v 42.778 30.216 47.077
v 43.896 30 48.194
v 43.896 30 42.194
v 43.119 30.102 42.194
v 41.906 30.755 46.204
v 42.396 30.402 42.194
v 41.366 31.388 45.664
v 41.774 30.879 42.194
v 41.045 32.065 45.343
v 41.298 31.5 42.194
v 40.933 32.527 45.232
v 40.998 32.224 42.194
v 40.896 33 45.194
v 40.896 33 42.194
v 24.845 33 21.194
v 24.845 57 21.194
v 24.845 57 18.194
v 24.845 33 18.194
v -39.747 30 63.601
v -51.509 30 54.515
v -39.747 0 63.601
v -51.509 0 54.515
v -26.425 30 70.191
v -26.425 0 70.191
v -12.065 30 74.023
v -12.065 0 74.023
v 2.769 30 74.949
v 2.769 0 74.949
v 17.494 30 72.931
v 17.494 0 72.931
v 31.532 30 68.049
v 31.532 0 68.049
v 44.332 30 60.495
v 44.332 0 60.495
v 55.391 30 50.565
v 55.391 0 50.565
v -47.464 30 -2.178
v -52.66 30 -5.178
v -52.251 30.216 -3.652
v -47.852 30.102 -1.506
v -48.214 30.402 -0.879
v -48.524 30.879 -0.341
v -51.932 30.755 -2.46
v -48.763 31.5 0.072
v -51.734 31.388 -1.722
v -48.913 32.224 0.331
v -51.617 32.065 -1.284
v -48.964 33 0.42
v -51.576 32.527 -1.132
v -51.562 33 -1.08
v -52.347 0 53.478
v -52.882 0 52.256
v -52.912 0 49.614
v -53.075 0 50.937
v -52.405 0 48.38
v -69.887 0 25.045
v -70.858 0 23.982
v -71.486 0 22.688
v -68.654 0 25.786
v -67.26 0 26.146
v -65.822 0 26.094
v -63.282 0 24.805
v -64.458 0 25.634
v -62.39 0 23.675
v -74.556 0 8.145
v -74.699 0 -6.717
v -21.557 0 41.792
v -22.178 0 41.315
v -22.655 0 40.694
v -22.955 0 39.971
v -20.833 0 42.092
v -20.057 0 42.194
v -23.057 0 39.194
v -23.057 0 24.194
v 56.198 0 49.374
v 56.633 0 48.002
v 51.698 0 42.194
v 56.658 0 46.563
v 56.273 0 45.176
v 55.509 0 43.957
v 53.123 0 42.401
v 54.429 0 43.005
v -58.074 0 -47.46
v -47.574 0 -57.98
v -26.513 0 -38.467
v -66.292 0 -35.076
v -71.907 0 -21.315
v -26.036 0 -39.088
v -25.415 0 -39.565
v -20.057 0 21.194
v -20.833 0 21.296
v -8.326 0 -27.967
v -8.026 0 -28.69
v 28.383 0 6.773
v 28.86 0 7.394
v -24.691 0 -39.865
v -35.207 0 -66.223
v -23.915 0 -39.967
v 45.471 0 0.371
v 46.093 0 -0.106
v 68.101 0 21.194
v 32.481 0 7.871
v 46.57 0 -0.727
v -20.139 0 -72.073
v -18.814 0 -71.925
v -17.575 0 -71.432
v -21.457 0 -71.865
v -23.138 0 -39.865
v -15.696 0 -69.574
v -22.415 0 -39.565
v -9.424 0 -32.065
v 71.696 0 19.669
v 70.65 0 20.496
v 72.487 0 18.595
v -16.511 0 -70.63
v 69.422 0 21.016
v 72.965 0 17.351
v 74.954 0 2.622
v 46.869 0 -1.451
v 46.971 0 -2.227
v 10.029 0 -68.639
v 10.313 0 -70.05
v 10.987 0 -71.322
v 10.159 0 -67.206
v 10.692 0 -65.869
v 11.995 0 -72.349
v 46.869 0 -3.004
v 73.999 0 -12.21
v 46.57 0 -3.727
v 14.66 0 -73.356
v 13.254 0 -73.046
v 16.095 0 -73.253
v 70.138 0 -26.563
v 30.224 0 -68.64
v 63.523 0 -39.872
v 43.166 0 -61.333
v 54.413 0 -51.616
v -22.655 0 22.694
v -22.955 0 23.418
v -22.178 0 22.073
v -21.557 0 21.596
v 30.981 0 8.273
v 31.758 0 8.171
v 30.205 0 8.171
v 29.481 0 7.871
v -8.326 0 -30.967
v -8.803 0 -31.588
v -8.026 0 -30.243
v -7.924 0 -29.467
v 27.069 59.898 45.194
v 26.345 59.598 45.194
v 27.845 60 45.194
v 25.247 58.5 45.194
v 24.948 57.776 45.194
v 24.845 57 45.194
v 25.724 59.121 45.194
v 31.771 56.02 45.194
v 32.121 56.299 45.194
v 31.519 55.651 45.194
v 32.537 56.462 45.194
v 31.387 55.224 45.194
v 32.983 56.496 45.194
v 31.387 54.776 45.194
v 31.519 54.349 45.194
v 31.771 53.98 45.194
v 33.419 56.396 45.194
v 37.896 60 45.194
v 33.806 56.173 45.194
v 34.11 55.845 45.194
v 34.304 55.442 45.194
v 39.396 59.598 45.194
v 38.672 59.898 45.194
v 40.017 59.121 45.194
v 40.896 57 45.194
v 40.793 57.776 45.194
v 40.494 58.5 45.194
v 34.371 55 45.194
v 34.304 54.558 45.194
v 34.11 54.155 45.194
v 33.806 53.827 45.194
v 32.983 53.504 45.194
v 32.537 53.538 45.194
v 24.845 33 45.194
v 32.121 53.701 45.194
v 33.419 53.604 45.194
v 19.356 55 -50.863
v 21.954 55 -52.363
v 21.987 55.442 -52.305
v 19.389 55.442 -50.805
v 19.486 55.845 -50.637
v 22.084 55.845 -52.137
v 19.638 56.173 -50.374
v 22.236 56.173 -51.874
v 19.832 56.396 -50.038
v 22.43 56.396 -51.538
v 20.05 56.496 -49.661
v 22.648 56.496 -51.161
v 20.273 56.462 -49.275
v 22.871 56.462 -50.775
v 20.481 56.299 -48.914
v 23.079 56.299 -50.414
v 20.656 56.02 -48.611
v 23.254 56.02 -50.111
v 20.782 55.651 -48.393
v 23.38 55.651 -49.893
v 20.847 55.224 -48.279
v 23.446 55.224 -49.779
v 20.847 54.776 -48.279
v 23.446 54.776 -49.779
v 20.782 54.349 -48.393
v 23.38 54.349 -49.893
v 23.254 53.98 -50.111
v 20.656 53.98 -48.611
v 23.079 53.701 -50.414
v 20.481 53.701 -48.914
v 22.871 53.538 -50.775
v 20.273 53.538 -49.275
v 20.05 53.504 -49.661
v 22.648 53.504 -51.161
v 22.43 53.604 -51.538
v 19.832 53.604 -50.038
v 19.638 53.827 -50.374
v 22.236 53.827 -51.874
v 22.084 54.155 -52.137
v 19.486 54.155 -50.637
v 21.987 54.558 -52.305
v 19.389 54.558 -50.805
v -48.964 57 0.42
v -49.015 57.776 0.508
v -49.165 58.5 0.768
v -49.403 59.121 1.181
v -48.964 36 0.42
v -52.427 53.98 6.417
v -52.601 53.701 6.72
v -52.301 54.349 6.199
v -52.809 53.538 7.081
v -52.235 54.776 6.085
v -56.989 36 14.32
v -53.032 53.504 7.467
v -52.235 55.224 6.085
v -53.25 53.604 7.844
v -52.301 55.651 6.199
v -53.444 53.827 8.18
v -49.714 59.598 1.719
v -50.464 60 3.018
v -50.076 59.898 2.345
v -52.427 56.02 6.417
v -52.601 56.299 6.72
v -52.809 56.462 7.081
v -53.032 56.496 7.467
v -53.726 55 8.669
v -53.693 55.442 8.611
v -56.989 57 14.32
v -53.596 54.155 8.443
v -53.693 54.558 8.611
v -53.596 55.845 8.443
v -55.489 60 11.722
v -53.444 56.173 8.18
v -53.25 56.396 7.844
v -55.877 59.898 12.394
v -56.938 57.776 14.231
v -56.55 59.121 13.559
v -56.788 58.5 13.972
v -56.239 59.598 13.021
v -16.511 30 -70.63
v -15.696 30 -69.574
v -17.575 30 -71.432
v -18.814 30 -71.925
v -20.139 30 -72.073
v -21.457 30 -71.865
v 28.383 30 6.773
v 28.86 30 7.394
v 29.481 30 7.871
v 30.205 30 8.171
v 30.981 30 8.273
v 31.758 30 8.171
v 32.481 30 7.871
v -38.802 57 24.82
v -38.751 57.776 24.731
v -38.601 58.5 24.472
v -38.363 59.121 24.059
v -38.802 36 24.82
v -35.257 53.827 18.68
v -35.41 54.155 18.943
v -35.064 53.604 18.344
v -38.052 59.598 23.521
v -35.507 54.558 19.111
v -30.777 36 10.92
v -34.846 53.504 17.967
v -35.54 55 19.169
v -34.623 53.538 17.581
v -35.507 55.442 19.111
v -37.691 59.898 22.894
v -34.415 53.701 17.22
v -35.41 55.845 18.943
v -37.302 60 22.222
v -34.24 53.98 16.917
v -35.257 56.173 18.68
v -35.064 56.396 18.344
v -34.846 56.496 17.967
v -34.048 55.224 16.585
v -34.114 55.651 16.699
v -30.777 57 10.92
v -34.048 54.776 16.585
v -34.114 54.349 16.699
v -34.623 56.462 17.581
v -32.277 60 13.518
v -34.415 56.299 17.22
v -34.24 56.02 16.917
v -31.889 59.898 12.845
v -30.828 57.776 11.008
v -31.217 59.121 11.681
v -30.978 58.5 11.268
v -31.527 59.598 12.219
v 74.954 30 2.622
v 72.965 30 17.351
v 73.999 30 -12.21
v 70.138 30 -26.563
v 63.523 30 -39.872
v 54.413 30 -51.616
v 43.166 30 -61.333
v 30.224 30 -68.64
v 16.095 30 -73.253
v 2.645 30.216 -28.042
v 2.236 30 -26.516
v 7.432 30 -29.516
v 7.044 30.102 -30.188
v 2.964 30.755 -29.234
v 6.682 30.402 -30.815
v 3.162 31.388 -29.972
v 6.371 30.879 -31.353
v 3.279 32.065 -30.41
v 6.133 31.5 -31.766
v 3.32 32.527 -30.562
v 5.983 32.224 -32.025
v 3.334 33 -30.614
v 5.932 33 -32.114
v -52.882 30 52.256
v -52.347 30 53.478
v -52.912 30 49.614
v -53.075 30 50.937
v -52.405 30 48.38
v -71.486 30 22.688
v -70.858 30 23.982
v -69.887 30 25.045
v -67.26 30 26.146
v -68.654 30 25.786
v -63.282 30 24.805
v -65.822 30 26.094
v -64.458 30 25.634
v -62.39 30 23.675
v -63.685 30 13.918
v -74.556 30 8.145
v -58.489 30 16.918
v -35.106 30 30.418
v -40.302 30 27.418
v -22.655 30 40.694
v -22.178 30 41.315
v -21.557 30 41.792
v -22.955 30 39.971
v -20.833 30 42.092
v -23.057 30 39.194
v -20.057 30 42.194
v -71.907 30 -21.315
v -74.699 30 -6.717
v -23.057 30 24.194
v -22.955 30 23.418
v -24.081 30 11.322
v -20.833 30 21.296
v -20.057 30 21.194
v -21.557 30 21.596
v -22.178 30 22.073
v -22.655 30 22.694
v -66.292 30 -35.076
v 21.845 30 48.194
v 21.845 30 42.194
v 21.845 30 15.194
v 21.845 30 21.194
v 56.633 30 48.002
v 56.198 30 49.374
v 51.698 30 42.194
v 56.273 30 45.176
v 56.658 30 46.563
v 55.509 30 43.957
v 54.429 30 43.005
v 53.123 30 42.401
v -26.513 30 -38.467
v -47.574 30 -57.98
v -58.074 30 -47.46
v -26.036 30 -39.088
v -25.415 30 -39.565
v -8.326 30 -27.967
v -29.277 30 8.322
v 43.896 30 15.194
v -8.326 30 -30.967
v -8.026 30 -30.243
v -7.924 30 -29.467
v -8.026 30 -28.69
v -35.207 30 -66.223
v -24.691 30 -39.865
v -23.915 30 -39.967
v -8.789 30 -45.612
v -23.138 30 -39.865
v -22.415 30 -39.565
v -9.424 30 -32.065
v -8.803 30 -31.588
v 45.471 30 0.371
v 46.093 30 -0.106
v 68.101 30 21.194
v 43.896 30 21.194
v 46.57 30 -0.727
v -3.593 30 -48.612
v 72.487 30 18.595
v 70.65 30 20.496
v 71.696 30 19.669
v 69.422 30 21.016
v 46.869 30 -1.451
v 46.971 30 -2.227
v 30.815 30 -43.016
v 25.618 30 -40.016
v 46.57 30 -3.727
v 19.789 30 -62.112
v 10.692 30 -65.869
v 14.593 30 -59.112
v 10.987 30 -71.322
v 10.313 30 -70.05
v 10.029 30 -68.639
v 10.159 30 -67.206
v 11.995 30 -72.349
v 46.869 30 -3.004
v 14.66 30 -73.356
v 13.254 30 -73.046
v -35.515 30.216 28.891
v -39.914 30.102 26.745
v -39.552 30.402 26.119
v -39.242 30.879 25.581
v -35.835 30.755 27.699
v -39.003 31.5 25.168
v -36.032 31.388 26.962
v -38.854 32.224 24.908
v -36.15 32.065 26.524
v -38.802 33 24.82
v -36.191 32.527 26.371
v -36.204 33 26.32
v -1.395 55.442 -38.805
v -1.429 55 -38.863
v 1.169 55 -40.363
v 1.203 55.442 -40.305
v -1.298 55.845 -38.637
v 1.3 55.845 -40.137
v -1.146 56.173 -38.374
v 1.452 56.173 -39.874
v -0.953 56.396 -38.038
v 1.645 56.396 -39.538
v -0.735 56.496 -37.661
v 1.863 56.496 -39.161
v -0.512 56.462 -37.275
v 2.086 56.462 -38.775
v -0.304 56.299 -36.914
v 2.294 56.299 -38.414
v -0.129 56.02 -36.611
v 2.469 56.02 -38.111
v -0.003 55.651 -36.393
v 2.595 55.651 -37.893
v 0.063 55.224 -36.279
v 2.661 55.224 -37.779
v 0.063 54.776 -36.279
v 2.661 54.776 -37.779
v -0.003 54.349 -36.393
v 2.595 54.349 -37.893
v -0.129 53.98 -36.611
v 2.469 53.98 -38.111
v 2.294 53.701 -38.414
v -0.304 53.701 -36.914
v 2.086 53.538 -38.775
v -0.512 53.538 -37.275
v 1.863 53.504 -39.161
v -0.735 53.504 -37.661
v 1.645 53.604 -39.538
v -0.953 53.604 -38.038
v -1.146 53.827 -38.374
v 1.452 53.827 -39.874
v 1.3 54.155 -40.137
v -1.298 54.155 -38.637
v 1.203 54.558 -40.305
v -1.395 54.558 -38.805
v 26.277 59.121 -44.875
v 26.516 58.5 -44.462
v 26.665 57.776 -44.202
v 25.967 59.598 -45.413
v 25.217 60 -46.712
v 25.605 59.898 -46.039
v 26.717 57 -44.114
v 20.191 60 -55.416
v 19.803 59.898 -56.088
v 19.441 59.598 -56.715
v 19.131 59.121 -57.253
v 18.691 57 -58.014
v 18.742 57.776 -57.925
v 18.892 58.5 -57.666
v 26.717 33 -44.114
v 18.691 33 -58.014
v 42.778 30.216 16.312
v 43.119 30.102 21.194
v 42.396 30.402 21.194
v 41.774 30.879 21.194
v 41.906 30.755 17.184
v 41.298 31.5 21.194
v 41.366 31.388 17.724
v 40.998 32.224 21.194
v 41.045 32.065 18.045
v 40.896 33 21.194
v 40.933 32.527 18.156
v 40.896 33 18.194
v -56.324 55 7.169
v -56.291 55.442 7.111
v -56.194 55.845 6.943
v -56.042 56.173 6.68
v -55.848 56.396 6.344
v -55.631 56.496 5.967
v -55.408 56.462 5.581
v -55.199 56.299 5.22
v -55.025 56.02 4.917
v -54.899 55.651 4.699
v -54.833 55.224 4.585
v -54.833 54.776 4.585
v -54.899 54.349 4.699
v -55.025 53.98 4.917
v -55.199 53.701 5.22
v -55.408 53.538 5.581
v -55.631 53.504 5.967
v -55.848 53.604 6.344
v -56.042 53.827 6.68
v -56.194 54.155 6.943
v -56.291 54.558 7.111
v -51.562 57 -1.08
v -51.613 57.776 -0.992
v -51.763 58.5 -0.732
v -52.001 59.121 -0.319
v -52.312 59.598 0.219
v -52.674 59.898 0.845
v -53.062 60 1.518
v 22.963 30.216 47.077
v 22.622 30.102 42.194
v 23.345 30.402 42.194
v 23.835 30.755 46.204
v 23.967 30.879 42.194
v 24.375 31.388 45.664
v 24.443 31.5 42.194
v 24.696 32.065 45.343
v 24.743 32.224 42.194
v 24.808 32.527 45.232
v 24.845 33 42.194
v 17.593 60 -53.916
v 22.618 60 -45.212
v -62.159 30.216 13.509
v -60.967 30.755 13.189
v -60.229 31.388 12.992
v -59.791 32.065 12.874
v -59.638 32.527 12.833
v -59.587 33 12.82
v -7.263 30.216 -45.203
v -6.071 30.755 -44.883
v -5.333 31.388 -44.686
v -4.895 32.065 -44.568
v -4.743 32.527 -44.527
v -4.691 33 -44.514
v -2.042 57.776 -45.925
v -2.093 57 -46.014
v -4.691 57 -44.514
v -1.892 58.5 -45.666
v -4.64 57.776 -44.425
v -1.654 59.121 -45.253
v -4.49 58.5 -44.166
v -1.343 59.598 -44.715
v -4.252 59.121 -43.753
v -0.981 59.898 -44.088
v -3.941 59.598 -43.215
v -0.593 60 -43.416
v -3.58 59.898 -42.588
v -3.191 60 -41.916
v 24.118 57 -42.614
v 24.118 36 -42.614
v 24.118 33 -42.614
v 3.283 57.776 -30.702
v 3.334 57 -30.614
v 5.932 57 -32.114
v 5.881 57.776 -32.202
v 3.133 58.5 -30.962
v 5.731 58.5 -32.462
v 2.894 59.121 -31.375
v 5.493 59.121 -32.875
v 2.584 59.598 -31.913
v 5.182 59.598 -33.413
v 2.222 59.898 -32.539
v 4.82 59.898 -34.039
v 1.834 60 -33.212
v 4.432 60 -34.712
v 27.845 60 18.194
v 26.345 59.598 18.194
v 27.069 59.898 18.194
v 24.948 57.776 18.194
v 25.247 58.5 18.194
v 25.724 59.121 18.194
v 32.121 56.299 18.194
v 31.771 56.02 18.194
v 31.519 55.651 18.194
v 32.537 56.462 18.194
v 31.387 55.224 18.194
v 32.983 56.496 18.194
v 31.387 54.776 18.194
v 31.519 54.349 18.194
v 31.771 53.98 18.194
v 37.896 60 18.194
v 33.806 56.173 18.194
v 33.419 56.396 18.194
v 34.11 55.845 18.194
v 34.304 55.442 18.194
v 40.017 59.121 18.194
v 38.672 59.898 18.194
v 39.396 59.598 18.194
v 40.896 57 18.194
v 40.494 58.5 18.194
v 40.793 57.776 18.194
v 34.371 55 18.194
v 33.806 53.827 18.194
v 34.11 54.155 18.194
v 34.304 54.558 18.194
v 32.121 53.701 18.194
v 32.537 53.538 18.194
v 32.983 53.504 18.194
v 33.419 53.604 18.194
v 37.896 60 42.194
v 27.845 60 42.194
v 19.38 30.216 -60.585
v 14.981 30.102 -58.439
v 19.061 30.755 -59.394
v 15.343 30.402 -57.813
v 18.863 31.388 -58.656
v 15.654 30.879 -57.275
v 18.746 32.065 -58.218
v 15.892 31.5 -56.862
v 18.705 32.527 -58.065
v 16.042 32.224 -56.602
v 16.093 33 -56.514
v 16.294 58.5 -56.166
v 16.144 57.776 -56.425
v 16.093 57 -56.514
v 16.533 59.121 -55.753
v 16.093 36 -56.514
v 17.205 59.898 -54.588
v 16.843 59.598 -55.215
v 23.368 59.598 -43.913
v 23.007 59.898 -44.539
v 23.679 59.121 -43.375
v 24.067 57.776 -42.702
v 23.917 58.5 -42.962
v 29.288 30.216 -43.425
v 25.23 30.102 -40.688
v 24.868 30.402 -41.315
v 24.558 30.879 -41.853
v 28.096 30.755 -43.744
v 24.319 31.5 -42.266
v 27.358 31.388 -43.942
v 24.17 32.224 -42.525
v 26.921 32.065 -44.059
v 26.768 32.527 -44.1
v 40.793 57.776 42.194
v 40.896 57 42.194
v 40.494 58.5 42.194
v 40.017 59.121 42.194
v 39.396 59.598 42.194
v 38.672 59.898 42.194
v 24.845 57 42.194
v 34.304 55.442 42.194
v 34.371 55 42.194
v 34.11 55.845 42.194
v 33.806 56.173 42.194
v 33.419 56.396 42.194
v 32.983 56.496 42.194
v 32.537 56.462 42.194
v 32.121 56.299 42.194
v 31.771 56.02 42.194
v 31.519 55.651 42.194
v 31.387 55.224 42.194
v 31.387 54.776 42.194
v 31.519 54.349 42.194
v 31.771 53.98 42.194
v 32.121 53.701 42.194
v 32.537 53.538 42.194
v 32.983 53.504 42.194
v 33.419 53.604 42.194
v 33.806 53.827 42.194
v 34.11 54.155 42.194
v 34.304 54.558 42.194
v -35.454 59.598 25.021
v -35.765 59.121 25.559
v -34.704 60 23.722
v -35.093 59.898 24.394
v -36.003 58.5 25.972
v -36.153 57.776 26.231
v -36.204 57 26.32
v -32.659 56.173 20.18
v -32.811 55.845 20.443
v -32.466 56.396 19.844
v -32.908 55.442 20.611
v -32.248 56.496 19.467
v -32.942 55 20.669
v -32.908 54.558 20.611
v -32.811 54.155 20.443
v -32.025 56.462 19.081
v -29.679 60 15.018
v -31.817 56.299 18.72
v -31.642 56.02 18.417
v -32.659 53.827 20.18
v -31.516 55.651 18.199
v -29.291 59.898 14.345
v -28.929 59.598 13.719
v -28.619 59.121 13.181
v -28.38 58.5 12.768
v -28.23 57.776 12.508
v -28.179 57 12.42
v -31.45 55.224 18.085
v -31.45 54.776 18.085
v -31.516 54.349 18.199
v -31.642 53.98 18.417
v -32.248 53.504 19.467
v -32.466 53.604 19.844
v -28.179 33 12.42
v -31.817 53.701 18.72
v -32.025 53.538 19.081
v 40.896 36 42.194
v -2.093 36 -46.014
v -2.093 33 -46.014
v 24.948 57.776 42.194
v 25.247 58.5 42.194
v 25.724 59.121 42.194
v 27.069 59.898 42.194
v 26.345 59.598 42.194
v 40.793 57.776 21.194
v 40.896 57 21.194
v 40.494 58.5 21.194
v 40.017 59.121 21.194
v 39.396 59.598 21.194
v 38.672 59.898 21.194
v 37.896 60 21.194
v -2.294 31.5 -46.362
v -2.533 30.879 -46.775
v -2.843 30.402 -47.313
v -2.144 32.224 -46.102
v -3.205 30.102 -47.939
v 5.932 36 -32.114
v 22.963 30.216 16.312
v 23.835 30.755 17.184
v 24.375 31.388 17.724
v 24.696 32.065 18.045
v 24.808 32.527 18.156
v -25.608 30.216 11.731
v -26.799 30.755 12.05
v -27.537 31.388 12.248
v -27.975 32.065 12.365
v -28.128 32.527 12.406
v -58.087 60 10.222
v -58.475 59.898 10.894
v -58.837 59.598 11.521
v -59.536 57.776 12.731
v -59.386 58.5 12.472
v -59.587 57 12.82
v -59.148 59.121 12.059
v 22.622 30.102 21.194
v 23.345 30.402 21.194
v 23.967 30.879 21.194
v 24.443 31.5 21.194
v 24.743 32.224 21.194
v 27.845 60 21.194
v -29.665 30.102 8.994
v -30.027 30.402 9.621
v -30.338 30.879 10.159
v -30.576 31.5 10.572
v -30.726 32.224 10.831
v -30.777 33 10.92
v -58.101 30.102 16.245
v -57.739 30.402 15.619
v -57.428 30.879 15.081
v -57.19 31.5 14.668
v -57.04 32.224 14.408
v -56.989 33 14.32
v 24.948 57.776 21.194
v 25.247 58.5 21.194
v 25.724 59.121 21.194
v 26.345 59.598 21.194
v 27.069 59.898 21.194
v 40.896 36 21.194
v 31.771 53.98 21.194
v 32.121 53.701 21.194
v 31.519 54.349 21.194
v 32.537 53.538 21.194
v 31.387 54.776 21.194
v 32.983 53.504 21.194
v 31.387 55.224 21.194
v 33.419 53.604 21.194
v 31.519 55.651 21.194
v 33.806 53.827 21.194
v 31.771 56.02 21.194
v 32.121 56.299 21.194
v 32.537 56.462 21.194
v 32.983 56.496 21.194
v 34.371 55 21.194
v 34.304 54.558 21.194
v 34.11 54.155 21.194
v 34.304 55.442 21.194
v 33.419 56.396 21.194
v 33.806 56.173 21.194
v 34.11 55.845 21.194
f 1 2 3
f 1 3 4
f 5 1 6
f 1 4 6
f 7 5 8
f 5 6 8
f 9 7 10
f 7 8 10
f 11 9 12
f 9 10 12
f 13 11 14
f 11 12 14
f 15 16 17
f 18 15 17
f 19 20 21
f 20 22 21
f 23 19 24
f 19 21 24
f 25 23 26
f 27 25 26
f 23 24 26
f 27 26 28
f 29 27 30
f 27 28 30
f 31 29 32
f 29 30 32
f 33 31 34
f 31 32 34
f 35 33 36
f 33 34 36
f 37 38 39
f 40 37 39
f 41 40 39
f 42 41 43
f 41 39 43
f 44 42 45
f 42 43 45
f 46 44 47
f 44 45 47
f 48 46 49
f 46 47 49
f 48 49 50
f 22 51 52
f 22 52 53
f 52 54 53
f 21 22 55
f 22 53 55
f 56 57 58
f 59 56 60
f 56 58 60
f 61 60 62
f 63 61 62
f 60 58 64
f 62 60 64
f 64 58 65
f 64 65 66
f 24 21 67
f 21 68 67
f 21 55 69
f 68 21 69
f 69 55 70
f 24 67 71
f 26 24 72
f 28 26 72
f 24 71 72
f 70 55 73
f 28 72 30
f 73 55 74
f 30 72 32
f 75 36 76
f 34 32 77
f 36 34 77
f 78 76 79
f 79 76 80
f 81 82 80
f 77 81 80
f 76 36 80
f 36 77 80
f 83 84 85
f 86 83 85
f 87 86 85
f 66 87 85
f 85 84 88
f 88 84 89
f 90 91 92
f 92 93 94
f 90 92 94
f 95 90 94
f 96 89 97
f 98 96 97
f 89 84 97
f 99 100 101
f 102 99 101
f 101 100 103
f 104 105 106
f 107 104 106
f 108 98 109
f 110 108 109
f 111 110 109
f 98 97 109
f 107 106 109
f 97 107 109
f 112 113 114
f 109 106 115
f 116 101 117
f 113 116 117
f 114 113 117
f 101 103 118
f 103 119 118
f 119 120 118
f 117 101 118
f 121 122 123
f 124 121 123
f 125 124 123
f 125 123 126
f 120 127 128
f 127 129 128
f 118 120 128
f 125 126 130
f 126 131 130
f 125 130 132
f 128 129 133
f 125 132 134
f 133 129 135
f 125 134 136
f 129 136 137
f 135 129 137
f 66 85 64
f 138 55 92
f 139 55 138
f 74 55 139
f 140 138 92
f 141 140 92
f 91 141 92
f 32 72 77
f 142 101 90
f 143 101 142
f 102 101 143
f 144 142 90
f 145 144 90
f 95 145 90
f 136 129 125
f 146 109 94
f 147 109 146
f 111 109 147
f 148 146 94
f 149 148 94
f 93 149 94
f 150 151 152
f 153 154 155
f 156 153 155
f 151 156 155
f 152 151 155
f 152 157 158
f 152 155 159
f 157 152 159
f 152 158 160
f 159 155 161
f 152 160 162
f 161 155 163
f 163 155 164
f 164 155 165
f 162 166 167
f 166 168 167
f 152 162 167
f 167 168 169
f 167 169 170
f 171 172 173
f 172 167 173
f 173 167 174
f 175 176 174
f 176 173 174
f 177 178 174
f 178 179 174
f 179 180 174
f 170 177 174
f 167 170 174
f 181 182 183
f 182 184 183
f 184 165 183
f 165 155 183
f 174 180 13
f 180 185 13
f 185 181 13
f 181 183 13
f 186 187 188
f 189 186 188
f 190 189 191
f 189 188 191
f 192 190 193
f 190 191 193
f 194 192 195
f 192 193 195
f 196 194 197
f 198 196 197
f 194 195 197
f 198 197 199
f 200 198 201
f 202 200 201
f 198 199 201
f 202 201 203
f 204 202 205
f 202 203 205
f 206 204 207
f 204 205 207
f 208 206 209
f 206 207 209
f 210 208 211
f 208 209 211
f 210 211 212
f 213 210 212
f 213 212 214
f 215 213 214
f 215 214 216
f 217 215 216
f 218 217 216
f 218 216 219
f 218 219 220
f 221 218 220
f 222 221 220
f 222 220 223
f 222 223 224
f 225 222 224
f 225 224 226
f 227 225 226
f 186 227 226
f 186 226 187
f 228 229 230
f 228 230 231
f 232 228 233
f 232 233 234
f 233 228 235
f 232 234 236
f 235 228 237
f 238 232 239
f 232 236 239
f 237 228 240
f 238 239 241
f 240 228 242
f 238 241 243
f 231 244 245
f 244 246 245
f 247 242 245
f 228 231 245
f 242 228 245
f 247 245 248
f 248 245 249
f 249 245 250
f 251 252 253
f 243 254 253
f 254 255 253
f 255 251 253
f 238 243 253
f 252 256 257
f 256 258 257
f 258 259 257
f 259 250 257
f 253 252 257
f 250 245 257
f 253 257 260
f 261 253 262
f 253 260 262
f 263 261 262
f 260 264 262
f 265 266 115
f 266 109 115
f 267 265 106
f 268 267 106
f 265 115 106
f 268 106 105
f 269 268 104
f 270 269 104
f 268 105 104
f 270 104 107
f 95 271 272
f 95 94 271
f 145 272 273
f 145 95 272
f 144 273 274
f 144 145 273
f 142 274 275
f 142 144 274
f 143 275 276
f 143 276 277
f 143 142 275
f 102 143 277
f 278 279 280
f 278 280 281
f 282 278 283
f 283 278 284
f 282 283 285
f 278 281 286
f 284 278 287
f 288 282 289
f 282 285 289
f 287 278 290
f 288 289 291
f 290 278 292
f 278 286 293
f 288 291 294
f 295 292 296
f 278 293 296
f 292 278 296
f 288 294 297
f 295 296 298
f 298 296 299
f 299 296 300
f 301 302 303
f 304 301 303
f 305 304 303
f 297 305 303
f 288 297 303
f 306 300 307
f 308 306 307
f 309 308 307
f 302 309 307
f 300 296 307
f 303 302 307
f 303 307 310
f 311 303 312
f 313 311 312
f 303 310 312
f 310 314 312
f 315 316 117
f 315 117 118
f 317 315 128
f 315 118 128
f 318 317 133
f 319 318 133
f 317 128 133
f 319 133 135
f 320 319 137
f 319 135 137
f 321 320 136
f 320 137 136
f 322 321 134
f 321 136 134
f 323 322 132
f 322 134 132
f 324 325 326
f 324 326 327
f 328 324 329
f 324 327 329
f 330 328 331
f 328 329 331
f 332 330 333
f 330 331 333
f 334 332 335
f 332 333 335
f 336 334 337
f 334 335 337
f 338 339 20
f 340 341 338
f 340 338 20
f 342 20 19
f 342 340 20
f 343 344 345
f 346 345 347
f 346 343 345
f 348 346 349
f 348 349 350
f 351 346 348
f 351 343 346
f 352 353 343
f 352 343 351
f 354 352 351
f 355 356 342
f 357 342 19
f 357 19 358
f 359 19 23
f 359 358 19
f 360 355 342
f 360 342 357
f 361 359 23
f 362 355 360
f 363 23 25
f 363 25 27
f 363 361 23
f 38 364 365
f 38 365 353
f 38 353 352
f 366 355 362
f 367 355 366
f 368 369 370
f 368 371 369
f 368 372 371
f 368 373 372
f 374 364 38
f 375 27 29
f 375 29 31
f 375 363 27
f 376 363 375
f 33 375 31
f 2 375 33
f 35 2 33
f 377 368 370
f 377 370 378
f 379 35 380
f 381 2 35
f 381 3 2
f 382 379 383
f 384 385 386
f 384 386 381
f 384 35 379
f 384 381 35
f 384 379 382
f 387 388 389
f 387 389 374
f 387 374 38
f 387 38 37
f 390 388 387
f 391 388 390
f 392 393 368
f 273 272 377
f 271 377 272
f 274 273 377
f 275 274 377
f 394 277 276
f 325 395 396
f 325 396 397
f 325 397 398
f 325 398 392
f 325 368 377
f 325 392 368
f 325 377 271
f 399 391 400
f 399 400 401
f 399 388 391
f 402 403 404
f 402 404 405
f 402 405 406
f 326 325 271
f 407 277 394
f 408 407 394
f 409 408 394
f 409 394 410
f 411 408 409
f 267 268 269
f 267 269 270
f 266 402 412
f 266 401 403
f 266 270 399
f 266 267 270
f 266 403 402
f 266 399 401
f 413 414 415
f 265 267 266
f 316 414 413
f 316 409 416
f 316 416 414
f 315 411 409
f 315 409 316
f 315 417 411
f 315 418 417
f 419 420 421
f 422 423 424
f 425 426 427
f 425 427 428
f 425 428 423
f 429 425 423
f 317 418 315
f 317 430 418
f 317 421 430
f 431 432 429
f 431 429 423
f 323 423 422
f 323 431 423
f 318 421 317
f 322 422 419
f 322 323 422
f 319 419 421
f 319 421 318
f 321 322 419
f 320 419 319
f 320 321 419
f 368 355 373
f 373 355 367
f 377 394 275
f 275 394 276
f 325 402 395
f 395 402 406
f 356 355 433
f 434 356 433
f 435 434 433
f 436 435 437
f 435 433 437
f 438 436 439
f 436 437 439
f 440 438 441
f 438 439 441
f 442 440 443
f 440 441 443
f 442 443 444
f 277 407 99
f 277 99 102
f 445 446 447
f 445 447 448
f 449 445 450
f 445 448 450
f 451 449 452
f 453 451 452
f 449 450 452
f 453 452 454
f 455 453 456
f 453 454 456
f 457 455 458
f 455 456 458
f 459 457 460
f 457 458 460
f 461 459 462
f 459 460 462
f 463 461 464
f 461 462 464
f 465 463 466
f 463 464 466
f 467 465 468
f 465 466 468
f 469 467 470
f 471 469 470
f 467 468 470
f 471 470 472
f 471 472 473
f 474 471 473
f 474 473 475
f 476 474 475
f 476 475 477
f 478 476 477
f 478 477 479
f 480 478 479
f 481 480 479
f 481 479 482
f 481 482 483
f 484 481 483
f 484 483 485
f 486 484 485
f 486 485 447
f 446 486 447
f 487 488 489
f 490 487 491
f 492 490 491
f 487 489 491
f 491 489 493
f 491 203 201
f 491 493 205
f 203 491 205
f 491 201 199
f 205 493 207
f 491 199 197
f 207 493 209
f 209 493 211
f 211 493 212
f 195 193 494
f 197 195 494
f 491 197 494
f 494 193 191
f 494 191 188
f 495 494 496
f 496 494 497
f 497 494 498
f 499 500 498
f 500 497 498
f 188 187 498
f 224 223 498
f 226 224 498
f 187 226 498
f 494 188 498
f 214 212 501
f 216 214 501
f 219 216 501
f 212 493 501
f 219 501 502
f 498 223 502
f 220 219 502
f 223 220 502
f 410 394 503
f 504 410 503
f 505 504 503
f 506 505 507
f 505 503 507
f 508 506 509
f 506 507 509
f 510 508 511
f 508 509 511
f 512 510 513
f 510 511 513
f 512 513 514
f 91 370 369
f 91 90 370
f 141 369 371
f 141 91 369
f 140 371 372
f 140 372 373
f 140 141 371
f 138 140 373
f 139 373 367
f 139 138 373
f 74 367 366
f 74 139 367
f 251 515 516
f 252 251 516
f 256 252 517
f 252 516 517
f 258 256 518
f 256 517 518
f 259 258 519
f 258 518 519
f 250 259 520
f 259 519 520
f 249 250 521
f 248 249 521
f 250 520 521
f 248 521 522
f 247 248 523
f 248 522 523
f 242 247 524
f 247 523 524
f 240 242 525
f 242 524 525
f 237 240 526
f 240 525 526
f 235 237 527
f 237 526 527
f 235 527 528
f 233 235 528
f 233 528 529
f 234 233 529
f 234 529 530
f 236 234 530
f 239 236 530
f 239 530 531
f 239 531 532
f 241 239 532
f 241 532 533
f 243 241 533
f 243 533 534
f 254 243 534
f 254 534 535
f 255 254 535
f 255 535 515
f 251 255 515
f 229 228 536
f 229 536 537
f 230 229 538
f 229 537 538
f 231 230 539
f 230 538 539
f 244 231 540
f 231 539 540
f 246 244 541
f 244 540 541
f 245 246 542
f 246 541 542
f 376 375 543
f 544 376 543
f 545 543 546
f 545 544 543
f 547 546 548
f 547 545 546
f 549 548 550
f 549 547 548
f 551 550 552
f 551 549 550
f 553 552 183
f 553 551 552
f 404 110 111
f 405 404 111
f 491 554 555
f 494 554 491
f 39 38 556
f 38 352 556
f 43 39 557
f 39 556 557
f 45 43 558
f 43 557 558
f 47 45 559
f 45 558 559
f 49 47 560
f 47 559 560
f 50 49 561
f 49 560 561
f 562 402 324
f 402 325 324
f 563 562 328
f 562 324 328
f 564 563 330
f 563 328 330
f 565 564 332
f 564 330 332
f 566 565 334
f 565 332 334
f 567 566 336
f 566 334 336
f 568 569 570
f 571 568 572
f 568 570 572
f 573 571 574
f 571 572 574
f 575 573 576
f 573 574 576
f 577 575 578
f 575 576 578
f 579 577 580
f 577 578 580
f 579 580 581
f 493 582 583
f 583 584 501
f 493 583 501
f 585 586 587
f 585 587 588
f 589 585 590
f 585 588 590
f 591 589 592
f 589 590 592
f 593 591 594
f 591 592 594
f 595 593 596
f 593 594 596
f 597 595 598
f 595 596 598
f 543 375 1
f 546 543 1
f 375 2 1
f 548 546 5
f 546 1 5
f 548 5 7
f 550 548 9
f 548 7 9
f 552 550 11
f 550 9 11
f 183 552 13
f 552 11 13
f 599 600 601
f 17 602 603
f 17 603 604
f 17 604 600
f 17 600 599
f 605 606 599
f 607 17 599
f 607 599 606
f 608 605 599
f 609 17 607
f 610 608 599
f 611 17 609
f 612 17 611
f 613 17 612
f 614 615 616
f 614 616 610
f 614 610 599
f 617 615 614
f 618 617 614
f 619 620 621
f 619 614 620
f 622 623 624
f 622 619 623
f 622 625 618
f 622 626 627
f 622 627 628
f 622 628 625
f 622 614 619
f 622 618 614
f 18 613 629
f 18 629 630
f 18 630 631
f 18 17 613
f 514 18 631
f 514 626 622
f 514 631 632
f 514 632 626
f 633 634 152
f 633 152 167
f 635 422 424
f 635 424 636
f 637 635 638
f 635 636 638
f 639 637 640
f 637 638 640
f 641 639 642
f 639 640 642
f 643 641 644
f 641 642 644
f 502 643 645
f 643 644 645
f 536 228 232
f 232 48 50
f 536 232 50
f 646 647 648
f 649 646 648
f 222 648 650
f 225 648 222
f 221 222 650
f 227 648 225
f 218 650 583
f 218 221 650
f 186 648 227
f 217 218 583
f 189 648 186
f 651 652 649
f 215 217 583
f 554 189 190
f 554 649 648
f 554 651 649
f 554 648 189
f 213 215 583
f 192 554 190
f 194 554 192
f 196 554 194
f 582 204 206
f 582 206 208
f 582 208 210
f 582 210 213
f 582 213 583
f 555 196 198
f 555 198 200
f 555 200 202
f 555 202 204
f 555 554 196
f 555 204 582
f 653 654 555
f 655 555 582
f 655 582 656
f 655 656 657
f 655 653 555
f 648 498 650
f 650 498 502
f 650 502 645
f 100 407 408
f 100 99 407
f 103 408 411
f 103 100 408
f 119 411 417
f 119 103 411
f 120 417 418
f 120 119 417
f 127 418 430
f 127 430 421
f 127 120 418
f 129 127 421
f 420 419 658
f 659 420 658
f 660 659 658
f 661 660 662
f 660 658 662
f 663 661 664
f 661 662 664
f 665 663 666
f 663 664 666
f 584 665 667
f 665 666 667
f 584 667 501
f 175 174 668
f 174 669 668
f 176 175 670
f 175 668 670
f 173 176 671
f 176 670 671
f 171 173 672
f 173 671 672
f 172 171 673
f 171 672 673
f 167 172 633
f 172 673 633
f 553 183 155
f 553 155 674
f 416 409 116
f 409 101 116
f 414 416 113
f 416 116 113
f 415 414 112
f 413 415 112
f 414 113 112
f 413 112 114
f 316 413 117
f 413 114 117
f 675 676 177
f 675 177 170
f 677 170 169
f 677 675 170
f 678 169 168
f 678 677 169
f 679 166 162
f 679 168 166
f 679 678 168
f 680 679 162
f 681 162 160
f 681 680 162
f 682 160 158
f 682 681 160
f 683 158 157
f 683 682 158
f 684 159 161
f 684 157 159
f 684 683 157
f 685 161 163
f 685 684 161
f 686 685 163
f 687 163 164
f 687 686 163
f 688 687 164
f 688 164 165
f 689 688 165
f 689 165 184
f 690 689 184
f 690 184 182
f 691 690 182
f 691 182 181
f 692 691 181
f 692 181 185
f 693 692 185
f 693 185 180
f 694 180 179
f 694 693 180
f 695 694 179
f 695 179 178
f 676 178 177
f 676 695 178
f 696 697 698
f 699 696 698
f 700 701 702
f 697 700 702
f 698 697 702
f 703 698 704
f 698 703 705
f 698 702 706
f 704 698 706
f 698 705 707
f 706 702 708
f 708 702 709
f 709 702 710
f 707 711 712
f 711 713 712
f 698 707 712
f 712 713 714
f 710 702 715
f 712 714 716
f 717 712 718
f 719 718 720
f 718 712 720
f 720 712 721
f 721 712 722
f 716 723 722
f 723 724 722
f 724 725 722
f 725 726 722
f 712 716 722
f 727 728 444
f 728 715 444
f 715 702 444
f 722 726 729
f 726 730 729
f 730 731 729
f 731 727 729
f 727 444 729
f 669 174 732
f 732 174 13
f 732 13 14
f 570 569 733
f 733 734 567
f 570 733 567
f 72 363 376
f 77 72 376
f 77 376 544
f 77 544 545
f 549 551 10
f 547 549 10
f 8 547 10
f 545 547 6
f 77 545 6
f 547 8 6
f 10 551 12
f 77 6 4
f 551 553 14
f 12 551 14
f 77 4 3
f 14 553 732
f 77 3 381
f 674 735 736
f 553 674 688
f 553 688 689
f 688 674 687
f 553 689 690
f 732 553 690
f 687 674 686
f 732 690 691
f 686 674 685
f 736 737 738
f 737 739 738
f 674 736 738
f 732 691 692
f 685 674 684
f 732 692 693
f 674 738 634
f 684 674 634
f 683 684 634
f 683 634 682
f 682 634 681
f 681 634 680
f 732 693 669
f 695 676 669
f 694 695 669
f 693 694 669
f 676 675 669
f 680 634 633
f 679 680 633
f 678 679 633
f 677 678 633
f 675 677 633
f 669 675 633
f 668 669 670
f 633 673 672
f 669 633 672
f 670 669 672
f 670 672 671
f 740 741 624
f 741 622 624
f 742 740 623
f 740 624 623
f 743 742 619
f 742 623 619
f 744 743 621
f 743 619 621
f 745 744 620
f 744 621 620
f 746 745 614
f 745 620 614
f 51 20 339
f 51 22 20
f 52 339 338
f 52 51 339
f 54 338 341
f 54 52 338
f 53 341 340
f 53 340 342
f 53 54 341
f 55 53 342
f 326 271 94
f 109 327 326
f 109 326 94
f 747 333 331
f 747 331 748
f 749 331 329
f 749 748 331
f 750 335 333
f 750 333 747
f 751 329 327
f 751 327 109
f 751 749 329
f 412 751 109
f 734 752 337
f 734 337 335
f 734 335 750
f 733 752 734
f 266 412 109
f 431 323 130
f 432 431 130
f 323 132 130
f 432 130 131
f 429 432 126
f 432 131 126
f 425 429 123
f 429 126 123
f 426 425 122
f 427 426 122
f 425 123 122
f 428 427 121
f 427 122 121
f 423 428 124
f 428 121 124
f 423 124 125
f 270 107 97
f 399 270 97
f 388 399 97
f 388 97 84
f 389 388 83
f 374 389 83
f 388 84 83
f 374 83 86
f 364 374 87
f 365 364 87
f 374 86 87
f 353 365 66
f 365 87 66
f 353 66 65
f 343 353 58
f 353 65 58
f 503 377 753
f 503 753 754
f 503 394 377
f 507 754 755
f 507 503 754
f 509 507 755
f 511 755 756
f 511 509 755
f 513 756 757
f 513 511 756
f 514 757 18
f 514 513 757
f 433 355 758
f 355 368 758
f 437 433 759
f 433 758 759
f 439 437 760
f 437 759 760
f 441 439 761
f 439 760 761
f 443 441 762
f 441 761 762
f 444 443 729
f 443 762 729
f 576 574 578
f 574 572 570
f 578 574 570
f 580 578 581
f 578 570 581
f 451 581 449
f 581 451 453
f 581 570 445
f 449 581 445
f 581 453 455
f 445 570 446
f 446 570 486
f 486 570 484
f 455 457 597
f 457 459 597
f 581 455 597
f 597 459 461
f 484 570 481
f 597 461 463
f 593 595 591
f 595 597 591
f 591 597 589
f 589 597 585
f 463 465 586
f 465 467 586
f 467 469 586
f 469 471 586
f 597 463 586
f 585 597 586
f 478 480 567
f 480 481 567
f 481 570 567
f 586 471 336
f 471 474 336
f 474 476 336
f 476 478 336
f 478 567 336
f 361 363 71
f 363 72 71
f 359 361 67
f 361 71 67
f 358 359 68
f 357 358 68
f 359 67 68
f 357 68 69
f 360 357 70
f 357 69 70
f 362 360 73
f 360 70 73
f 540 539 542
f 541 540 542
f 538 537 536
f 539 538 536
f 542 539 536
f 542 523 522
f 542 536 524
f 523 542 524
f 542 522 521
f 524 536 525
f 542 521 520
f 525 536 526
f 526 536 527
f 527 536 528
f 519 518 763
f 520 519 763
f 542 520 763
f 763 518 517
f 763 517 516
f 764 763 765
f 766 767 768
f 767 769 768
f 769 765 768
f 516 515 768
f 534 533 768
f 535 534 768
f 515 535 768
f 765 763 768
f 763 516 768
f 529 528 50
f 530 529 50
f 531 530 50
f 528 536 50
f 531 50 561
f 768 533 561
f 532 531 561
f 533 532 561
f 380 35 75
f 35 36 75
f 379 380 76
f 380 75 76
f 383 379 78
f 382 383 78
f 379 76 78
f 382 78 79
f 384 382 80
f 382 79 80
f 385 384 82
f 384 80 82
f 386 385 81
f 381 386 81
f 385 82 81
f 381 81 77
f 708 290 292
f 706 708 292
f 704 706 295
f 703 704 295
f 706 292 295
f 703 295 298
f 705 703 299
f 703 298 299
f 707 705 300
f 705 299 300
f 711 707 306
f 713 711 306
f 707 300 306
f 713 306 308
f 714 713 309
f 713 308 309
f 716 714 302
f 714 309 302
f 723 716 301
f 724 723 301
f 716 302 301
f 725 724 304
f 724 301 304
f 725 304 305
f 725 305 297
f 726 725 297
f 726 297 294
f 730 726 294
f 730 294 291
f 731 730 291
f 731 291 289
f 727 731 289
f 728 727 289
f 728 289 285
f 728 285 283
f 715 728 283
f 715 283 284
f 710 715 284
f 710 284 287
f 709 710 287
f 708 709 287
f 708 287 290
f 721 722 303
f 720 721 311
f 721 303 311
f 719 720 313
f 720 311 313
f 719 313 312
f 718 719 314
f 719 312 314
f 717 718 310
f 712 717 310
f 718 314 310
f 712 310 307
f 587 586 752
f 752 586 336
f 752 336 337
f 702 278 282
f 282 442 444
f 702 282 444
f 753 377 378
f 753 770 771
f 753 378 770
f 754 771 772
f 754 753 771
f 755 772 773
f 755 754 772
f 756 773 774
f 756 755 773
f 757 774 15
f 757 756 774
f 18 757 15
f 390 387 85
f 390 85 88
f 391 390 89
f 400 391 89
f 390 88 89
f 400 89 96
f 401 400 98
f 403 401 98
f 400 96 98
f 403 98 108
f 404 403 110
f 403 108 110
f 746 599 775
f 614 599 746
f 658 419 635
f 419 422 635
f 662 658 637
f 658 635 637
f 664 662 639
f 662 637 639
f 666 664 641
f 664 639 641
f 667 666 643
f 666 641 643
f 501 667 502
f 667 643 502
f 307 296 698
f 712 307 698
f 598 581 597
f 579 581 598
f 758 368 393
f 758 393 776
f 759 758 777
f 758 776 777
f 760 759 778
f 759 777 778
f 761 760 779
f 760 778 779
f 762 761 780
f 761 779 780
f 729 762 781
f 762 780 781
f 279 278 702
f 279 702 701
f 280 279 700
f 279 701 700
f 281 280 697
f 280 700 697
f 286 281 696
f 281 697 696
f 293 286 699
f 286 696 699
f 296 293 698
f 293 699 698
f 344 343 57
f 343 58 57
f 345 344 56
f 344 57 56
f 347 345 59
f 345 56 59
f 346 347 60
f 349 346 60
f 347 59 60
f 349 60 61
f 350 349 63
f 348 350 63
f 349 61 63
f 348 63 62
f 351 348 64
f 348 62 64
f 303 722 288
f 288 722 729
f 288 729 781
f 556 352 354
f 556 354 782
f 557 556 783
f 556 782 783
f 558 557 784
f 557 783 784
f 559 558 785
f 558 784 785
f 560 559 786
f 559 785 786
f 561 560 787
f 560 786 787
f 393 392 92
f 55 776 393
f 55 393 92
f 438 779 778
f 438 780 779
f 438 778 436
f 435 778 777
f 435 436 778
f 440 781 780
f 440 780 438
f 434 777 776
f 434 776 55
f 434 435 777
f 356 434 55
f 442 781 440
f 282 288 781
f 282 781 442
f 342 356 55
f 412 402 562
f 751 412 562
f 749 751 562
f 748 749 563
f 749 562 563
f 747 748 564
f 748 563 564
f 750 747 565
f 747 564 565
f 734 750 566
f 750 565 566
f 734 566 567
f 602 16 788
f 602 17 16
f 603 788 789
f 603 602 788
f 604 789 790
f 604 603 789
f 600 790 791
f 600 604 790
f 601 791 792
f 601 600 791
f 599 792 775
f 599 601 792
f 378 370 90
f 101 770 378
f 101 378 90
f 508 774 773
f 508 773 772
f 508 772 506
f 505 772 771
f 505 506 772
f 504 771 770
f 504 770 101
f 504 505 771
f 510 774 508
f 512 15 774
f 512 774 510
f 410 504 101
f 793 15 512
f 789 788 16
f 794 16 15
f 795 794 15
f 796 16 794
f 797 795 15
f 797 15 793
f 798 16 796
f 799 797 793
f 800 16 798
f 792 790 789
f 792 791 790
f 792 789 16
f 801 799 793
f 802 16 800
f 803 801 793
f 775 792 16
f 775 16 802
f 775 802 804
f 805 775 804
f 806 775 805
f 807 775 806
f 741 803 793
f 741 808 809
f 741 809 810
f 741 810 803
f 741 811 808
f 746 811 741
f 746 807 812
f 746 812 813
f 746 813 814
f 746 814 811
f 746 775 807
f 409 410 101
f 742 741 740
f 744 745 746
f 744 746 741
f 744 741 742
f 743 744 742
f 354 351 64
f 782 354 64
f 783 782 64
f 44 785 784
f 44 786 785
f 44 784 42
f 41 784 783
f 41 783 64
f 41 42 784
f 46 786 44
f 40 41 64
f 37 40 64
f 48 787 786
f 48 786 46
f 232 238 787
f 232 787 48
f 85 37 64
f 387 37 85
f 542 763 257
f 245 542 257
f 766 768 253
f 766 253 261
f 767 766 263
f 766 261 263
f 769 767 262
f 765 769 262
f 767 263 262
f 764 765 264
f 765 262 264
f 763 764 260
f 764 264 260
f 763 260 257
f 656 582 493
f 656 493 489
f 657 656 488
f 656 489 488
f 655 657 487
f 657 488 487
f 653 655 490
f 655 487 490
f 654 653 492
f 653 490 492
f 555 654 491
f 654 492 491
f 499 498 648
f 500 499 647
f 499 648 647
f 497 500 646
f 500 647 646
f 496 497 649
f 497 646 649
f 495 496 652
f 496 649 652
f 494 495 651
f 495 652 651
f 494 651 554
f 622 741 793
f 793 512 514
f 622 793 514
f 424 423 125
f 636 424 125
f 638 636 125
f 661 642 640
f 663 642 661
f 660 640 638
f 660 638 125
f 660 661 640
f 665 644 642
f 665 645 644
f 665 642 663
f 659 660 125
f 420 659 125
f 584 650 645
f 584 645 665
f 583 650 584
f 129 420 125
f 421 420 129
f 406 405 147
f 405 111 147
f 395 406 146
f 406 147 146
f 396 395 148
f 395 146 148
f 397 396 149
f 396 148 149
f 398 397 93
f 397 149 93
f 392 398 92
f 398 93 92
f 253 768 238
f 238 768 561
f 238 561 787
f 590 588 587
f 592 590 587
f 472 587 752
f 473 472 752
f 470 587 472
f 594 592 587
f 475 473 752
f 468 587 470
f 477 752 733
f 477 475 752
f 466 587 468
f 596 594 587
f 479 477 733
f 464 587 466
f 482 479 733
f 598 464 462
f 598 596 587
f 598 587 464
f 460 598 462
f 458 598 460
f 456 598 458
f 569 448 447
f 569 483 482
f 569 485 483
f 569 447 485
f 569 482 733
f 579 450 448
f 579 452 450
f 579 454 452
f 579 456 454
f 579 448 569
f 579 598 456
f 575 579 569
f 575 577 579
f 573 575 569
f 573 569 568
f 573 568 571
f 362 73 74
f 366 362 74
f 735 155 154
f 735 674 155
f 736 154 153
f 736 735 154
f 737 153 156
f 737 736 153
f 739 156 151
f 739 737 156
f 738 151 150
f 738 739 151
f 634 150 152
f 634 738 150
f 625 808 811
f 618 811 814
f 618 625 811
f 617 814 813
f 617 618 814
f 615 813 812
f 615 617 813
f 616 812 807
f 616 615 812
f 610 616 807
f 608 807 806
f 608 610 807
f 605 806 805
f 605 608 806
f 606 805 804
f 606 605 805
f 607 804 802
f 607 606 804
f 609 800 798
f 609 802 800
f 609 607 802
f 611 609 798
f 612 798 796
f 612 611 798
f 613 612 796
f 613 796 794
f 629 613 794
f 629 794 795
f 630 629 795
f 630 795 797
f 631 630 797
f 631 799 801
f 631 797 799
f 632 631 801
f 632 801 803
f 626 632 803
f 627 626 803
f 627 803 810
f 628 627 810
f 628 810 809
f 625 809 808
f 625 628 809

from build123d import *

# Parameters (mm, degrees)
SKETCH1_R                = 75
BOSS_EXTRUDE1_DEPTH      = 30
SKETCH2_W                = 16.050334996
SKETCH2_H                = 27
BOSS_EXTRUDE3_DEPTH      = 30
SKETCH3_R                = 1.5
CUT_EXTRUDE3_DEPTH       = 57.805954881
CUT_EXTRUDE3_DEPTH_BACK  = 94.194045119
SKETCH4_R                = 1.5
CUT_EXTRUDE4_DEPTH       = 148.645950403
SKETCH6_R                = 1.5
CUT_EXTRUDE5_DEPTH       = 148.645950403
SKETCH7_W                = 16.050693915
SKETCH7_H                = 21
CUT_EXTRUDE6_DEPTH       = 24
CUT_EXTRUDE7_DEPTH       = 24
CUT_EXTRUDE8_DEPTH       = 24
FILLET4_R                = 3
CUT_EXTRUDE9_DEPTH       = 25
CUT_EXTRUDE9_DEPTH_BACK  = 37
CUT_EXTRUDE10_DEPTH      = 25
CUT_EXTRUDE10_DEPTH_BACK = 37
SKETCH12_W               = 95
SKETCH12_H               = 21
CUT_EXTRUDE11_DEPTH      = 25
CUT_EXTRUDE11_DEPTH_BACK = 37
FILLET5_R                = 5
FILLET6_R                = 3
FILLET7_R                = 3


with BuildPart() as part:
    # Sketch1 → Boss-Extrude1 (new body)
    with BuildSketch(Plane(origin=(0, 0, 0), x_dir=(1, 0, 0), z_dir=(0, 1, 0))):
        Circle(SKETCH1_R)
    extrude(amount=BOSS_EXTRUDE1_DEPTH)

    # Sketch2 → Boss-Extrude3 (add)
    with BuildSketch(Plane(origin=(0, 30, 0), x_dir=(1, 0, 0), z_dir=(0, 1, 0))):
        Polygon((3.333824547, 30.61373674), (26.716510449, 44.11373674), (18.691342951, 58.013734586), (-4.691342951, 44.513734586), align=None)
        with Locations((32.870528946, -31.694045119)):
            Rectangle(SKETCH2_W, SKETCH2_H)
        Polygon((-59.587039395, -12.819689466), (-36.204353493, -26.319689466), (-28.179185995, -12.419691621), (-51.561871897, 1.080308379), align=None)
    extrude(amount=BOSS_EXTRUDE3_DEPTH)

    # Sketch3 → Cut-Extrude3 (cut, two sides)
    with BuildSketch(Plane(origin=(24.845361448, 30, 18.194045119), x_dir=(1, 0, 0), z_dir=(0, 0, 1))) as cut_extrude3_sk:
        with Locations((8.025167498, 25)):
            Circle(SKETCH3_R)
    extrude(amount=CUT_EXTRUDE3_DEPTH, mode=Mode.SUBTRACT)
    extrude(cut_extrude3_sk.sketch, amount=-CUT_EXTRUDE3_DEPTH_BACK, mode=Mode.SUBTRACT)

    # Sketch4 → Cut-Extrude4 (cut, through all)
    with BuildSketch(Plane(origin=(-39.139191173, 0, -22.59702256), x_dir=(-0.5, 0, 0.866025404), z_dir=(-0.866025404, 0, -0.5))):
        with Locations((32.870528946, 55)):
            Circle(SKETCH4_R)
    extrude(amount=-CUT_EXTRUDE4_DEPTH, mode=Mode.SUBTRACT)

    # Sketch6 → Cut-Extrude5 (cut, through all)
    with BuildSketch(Plane(origin=(39.139191173, 0, -22.59702256), x_dir=(-0.5, 0, -0.866025404), z_dir=(0.866025404, 0, -0.5))):
        with Locations((32.870528946, 55)):
            Circle(SKETCH6_R)
    extrude(amount=-CUT_EXTRUDE5_DEPTH, mode=Mode.SUBTRACT)

    # Sketch7 → Cut-Extrude6 (cut)
    with BuildSketch(Plane(origin=(0, 60, 0), x_dir=(1, 0, 0), z_dir=(0, 1, 0))):
        with Locations((32.870349487, -31.694045119)):
            Rectangle(SKETCH7_W, SKETCH7_H)
    extrude(amount=-CUT_EXTRUDE6_DEPTH, mode=Mode.SUBTRACT)

    # Sketch8 → Cut-Extrude7 (cut)
    with BuildSketch(Plane(origin=(0, 60, 0), x_dir=(1, 0, 0), z_dir=(0, 1, 0))):
        Polygon((-30.777262206, -10.919691621), (-48.963795686, -0.419691621), (-56.988963184, -14.319689466), (-38.802429704, -24.819689466), align=None)
    extrude(amount=-CUT_EXTRUDE7_DEPTH, mode=Mode.SUBTRACT)

    # Sketch9 → Cut-Extrude8 (cut)
    with BuildSketch(Plane(origin=(0, 60, 0), x_dir=(1, 0, 0), z_dir=(0, 1, 0))):
        Polygon((16.09326674, 56.513734586), (24.118434238, 42.61373674), (5.931900758, 32.11373674), (-2.09326674, 46.013734586), align=None)
    extrude(amount=-CUT_EXTRUDE8_DEPTH, mode=Mode.SUBTRACT)

    # Fillet4
    fillet4_edges = [part.edges().sort_by_distance(p)[0] for p in [
        (24.845361448, 30, 31.694045119),
        (32.870528946, 30, 45.194045119),
        (40.895696444, 30, 31.694045119),
        (32.870528946, 30, 18.194045119),
        (22.7039267, 30, -51.063735663),
        (7, 30, -51.263734586),
        (-0.678759202, 30, -37.563735663),
        (15.025167498, 30, -37.36373674),
        (-32.191769744, 30, 19.369690543),
        (-39.870528946, 30, 5.669691621),
        (-55.574455646, 30, 5.869690543),
        (-47.895696444, 30, 19.569689466),
    ]]
    fillet(fillet4_edges, radius=FILLET4_R)

    # Sketch10 → Cut-Extrude9 (cut, two sides)
    with BuildSketch(Plane(origin=(0, 36, 0), x_dir=(1, 0, 0), z_dir=(0, 1, 0))) as cut_extrude9_sk:
        Polygon((-25.01267474, 41.064866756), (-6.82614126, 30.564866756), (-54.32614126, -51.707546603), (-72.51267474, -41.207546603), align=None)
    extrude(amount=CUT_EXTRUDE9_DEPTH, mode=Mode.SUBTRACT)
    extrude(cut_extrude9_sk.sketch, amount=-CUT_EXTRUDE9_DEPTH_BACK, mode=Mode.SUBTRACT)

    # Sketch11 → Cut-Extrude10 (cut, two sides)
    with BuildSketch(Plane(origin=(0, 36, 0), x_dir=(1, 0, 0), z_dir=(0, 1, 0))) as cut_extrude10_sk:
        Polygon((-17.616978296, 72.901591723), (0.569555184, 83.401591723), (48.069555184, 1.129178363), (29.883021704, -9.370821637), align=None)
    extrude(amount=CUT_EXTRUDE10_DEPTH, mode=Mode.SUBTRACT)
    extrude(cut_extrude10_sk.sketch, amount=-CUT_EXTRUDE10_DEPTH_BACK, mode=Mode.SUBTRACT)

    # Sketch12 → Cut-Extrude11 (cut, two sides)
    with BuildSketch(Plane(origin=(0, 36, 0), x_dir=(1, 0, 0), z_dir=(0, 1, 0))) as cut_extrude11_sk:
        with Locations((24.443119556, -31.694045119)):
            Rectangle(SKETCH12_W, SKETCH12_H)
    extrude(amount=CUT_EXTRUDE11_DEPTH, mode=Mode.SUBTRACT)
    extrude(cut_extrude11_sk.sketch, amount=-CUT_EXTRUDE11_DEPTH_BACK, mode=Mode.SUBTRACT)

    # Fillet5
    fillet5_edges = [part.edges().sort_by_distance(p)[0] for p in [
        (-67.543786445, 15, 32.60117962),
        (-54.32614126, 15, 51.707546603),
        (5.538443478, 15, -74.79522474),
        (-17.616978296, 15, -72.901591723),
        (62.005342967, 15, 42.194045119),
        (71.943119556, 15, 21.194045119),
    ]]
    fillet(fillet5_edges, radius=FILLET5_R)

    # Fillet6
    fillet6_edges = [part.edges().sort_by_distance(p)[0] for p in [
        (-25.01267474, 15, -41.064866756),
        (-6.82614126, 15, -30.564866756),
        (29.883021704, 15, 9.370821637),
        (48.069555184, 15, -1.129178363),
        (-23.056880444, 15, 42.194045119),
        (-23.056880444, 15, 21.194045119),
    ]]
    fillet(fillet6_edges, radius=FILLET6_R)

    # Fillet7
    fillet7_edges = [part.edges().sort_by_distance(p)[0] for p in [
        (-3.392304845, 60, -45.263734586),
        (25.417472343, 60, -43.36373674),
        (24.845361448, 60, 19.694045119),
        (40.895696444, 60, 43.694045119),
        (17.392304845, 60, -57.263734586),
        (4.632862653, 60, -31.36373674),
        (24.845361448, 60, 43.694045119),
        (40.895696444, 60, 19.694045119),
        (-50.262833792, 60, -0.330308379),
        (-37.503391599, 60, 25.569689466),
        (-29.478224101, 60, 11.669691621),
        (-58.28800129, 60, 13.569689466),
    ]]
    fillet(fillet7_edges, radius=FILLET7_R)


solid = part.part
